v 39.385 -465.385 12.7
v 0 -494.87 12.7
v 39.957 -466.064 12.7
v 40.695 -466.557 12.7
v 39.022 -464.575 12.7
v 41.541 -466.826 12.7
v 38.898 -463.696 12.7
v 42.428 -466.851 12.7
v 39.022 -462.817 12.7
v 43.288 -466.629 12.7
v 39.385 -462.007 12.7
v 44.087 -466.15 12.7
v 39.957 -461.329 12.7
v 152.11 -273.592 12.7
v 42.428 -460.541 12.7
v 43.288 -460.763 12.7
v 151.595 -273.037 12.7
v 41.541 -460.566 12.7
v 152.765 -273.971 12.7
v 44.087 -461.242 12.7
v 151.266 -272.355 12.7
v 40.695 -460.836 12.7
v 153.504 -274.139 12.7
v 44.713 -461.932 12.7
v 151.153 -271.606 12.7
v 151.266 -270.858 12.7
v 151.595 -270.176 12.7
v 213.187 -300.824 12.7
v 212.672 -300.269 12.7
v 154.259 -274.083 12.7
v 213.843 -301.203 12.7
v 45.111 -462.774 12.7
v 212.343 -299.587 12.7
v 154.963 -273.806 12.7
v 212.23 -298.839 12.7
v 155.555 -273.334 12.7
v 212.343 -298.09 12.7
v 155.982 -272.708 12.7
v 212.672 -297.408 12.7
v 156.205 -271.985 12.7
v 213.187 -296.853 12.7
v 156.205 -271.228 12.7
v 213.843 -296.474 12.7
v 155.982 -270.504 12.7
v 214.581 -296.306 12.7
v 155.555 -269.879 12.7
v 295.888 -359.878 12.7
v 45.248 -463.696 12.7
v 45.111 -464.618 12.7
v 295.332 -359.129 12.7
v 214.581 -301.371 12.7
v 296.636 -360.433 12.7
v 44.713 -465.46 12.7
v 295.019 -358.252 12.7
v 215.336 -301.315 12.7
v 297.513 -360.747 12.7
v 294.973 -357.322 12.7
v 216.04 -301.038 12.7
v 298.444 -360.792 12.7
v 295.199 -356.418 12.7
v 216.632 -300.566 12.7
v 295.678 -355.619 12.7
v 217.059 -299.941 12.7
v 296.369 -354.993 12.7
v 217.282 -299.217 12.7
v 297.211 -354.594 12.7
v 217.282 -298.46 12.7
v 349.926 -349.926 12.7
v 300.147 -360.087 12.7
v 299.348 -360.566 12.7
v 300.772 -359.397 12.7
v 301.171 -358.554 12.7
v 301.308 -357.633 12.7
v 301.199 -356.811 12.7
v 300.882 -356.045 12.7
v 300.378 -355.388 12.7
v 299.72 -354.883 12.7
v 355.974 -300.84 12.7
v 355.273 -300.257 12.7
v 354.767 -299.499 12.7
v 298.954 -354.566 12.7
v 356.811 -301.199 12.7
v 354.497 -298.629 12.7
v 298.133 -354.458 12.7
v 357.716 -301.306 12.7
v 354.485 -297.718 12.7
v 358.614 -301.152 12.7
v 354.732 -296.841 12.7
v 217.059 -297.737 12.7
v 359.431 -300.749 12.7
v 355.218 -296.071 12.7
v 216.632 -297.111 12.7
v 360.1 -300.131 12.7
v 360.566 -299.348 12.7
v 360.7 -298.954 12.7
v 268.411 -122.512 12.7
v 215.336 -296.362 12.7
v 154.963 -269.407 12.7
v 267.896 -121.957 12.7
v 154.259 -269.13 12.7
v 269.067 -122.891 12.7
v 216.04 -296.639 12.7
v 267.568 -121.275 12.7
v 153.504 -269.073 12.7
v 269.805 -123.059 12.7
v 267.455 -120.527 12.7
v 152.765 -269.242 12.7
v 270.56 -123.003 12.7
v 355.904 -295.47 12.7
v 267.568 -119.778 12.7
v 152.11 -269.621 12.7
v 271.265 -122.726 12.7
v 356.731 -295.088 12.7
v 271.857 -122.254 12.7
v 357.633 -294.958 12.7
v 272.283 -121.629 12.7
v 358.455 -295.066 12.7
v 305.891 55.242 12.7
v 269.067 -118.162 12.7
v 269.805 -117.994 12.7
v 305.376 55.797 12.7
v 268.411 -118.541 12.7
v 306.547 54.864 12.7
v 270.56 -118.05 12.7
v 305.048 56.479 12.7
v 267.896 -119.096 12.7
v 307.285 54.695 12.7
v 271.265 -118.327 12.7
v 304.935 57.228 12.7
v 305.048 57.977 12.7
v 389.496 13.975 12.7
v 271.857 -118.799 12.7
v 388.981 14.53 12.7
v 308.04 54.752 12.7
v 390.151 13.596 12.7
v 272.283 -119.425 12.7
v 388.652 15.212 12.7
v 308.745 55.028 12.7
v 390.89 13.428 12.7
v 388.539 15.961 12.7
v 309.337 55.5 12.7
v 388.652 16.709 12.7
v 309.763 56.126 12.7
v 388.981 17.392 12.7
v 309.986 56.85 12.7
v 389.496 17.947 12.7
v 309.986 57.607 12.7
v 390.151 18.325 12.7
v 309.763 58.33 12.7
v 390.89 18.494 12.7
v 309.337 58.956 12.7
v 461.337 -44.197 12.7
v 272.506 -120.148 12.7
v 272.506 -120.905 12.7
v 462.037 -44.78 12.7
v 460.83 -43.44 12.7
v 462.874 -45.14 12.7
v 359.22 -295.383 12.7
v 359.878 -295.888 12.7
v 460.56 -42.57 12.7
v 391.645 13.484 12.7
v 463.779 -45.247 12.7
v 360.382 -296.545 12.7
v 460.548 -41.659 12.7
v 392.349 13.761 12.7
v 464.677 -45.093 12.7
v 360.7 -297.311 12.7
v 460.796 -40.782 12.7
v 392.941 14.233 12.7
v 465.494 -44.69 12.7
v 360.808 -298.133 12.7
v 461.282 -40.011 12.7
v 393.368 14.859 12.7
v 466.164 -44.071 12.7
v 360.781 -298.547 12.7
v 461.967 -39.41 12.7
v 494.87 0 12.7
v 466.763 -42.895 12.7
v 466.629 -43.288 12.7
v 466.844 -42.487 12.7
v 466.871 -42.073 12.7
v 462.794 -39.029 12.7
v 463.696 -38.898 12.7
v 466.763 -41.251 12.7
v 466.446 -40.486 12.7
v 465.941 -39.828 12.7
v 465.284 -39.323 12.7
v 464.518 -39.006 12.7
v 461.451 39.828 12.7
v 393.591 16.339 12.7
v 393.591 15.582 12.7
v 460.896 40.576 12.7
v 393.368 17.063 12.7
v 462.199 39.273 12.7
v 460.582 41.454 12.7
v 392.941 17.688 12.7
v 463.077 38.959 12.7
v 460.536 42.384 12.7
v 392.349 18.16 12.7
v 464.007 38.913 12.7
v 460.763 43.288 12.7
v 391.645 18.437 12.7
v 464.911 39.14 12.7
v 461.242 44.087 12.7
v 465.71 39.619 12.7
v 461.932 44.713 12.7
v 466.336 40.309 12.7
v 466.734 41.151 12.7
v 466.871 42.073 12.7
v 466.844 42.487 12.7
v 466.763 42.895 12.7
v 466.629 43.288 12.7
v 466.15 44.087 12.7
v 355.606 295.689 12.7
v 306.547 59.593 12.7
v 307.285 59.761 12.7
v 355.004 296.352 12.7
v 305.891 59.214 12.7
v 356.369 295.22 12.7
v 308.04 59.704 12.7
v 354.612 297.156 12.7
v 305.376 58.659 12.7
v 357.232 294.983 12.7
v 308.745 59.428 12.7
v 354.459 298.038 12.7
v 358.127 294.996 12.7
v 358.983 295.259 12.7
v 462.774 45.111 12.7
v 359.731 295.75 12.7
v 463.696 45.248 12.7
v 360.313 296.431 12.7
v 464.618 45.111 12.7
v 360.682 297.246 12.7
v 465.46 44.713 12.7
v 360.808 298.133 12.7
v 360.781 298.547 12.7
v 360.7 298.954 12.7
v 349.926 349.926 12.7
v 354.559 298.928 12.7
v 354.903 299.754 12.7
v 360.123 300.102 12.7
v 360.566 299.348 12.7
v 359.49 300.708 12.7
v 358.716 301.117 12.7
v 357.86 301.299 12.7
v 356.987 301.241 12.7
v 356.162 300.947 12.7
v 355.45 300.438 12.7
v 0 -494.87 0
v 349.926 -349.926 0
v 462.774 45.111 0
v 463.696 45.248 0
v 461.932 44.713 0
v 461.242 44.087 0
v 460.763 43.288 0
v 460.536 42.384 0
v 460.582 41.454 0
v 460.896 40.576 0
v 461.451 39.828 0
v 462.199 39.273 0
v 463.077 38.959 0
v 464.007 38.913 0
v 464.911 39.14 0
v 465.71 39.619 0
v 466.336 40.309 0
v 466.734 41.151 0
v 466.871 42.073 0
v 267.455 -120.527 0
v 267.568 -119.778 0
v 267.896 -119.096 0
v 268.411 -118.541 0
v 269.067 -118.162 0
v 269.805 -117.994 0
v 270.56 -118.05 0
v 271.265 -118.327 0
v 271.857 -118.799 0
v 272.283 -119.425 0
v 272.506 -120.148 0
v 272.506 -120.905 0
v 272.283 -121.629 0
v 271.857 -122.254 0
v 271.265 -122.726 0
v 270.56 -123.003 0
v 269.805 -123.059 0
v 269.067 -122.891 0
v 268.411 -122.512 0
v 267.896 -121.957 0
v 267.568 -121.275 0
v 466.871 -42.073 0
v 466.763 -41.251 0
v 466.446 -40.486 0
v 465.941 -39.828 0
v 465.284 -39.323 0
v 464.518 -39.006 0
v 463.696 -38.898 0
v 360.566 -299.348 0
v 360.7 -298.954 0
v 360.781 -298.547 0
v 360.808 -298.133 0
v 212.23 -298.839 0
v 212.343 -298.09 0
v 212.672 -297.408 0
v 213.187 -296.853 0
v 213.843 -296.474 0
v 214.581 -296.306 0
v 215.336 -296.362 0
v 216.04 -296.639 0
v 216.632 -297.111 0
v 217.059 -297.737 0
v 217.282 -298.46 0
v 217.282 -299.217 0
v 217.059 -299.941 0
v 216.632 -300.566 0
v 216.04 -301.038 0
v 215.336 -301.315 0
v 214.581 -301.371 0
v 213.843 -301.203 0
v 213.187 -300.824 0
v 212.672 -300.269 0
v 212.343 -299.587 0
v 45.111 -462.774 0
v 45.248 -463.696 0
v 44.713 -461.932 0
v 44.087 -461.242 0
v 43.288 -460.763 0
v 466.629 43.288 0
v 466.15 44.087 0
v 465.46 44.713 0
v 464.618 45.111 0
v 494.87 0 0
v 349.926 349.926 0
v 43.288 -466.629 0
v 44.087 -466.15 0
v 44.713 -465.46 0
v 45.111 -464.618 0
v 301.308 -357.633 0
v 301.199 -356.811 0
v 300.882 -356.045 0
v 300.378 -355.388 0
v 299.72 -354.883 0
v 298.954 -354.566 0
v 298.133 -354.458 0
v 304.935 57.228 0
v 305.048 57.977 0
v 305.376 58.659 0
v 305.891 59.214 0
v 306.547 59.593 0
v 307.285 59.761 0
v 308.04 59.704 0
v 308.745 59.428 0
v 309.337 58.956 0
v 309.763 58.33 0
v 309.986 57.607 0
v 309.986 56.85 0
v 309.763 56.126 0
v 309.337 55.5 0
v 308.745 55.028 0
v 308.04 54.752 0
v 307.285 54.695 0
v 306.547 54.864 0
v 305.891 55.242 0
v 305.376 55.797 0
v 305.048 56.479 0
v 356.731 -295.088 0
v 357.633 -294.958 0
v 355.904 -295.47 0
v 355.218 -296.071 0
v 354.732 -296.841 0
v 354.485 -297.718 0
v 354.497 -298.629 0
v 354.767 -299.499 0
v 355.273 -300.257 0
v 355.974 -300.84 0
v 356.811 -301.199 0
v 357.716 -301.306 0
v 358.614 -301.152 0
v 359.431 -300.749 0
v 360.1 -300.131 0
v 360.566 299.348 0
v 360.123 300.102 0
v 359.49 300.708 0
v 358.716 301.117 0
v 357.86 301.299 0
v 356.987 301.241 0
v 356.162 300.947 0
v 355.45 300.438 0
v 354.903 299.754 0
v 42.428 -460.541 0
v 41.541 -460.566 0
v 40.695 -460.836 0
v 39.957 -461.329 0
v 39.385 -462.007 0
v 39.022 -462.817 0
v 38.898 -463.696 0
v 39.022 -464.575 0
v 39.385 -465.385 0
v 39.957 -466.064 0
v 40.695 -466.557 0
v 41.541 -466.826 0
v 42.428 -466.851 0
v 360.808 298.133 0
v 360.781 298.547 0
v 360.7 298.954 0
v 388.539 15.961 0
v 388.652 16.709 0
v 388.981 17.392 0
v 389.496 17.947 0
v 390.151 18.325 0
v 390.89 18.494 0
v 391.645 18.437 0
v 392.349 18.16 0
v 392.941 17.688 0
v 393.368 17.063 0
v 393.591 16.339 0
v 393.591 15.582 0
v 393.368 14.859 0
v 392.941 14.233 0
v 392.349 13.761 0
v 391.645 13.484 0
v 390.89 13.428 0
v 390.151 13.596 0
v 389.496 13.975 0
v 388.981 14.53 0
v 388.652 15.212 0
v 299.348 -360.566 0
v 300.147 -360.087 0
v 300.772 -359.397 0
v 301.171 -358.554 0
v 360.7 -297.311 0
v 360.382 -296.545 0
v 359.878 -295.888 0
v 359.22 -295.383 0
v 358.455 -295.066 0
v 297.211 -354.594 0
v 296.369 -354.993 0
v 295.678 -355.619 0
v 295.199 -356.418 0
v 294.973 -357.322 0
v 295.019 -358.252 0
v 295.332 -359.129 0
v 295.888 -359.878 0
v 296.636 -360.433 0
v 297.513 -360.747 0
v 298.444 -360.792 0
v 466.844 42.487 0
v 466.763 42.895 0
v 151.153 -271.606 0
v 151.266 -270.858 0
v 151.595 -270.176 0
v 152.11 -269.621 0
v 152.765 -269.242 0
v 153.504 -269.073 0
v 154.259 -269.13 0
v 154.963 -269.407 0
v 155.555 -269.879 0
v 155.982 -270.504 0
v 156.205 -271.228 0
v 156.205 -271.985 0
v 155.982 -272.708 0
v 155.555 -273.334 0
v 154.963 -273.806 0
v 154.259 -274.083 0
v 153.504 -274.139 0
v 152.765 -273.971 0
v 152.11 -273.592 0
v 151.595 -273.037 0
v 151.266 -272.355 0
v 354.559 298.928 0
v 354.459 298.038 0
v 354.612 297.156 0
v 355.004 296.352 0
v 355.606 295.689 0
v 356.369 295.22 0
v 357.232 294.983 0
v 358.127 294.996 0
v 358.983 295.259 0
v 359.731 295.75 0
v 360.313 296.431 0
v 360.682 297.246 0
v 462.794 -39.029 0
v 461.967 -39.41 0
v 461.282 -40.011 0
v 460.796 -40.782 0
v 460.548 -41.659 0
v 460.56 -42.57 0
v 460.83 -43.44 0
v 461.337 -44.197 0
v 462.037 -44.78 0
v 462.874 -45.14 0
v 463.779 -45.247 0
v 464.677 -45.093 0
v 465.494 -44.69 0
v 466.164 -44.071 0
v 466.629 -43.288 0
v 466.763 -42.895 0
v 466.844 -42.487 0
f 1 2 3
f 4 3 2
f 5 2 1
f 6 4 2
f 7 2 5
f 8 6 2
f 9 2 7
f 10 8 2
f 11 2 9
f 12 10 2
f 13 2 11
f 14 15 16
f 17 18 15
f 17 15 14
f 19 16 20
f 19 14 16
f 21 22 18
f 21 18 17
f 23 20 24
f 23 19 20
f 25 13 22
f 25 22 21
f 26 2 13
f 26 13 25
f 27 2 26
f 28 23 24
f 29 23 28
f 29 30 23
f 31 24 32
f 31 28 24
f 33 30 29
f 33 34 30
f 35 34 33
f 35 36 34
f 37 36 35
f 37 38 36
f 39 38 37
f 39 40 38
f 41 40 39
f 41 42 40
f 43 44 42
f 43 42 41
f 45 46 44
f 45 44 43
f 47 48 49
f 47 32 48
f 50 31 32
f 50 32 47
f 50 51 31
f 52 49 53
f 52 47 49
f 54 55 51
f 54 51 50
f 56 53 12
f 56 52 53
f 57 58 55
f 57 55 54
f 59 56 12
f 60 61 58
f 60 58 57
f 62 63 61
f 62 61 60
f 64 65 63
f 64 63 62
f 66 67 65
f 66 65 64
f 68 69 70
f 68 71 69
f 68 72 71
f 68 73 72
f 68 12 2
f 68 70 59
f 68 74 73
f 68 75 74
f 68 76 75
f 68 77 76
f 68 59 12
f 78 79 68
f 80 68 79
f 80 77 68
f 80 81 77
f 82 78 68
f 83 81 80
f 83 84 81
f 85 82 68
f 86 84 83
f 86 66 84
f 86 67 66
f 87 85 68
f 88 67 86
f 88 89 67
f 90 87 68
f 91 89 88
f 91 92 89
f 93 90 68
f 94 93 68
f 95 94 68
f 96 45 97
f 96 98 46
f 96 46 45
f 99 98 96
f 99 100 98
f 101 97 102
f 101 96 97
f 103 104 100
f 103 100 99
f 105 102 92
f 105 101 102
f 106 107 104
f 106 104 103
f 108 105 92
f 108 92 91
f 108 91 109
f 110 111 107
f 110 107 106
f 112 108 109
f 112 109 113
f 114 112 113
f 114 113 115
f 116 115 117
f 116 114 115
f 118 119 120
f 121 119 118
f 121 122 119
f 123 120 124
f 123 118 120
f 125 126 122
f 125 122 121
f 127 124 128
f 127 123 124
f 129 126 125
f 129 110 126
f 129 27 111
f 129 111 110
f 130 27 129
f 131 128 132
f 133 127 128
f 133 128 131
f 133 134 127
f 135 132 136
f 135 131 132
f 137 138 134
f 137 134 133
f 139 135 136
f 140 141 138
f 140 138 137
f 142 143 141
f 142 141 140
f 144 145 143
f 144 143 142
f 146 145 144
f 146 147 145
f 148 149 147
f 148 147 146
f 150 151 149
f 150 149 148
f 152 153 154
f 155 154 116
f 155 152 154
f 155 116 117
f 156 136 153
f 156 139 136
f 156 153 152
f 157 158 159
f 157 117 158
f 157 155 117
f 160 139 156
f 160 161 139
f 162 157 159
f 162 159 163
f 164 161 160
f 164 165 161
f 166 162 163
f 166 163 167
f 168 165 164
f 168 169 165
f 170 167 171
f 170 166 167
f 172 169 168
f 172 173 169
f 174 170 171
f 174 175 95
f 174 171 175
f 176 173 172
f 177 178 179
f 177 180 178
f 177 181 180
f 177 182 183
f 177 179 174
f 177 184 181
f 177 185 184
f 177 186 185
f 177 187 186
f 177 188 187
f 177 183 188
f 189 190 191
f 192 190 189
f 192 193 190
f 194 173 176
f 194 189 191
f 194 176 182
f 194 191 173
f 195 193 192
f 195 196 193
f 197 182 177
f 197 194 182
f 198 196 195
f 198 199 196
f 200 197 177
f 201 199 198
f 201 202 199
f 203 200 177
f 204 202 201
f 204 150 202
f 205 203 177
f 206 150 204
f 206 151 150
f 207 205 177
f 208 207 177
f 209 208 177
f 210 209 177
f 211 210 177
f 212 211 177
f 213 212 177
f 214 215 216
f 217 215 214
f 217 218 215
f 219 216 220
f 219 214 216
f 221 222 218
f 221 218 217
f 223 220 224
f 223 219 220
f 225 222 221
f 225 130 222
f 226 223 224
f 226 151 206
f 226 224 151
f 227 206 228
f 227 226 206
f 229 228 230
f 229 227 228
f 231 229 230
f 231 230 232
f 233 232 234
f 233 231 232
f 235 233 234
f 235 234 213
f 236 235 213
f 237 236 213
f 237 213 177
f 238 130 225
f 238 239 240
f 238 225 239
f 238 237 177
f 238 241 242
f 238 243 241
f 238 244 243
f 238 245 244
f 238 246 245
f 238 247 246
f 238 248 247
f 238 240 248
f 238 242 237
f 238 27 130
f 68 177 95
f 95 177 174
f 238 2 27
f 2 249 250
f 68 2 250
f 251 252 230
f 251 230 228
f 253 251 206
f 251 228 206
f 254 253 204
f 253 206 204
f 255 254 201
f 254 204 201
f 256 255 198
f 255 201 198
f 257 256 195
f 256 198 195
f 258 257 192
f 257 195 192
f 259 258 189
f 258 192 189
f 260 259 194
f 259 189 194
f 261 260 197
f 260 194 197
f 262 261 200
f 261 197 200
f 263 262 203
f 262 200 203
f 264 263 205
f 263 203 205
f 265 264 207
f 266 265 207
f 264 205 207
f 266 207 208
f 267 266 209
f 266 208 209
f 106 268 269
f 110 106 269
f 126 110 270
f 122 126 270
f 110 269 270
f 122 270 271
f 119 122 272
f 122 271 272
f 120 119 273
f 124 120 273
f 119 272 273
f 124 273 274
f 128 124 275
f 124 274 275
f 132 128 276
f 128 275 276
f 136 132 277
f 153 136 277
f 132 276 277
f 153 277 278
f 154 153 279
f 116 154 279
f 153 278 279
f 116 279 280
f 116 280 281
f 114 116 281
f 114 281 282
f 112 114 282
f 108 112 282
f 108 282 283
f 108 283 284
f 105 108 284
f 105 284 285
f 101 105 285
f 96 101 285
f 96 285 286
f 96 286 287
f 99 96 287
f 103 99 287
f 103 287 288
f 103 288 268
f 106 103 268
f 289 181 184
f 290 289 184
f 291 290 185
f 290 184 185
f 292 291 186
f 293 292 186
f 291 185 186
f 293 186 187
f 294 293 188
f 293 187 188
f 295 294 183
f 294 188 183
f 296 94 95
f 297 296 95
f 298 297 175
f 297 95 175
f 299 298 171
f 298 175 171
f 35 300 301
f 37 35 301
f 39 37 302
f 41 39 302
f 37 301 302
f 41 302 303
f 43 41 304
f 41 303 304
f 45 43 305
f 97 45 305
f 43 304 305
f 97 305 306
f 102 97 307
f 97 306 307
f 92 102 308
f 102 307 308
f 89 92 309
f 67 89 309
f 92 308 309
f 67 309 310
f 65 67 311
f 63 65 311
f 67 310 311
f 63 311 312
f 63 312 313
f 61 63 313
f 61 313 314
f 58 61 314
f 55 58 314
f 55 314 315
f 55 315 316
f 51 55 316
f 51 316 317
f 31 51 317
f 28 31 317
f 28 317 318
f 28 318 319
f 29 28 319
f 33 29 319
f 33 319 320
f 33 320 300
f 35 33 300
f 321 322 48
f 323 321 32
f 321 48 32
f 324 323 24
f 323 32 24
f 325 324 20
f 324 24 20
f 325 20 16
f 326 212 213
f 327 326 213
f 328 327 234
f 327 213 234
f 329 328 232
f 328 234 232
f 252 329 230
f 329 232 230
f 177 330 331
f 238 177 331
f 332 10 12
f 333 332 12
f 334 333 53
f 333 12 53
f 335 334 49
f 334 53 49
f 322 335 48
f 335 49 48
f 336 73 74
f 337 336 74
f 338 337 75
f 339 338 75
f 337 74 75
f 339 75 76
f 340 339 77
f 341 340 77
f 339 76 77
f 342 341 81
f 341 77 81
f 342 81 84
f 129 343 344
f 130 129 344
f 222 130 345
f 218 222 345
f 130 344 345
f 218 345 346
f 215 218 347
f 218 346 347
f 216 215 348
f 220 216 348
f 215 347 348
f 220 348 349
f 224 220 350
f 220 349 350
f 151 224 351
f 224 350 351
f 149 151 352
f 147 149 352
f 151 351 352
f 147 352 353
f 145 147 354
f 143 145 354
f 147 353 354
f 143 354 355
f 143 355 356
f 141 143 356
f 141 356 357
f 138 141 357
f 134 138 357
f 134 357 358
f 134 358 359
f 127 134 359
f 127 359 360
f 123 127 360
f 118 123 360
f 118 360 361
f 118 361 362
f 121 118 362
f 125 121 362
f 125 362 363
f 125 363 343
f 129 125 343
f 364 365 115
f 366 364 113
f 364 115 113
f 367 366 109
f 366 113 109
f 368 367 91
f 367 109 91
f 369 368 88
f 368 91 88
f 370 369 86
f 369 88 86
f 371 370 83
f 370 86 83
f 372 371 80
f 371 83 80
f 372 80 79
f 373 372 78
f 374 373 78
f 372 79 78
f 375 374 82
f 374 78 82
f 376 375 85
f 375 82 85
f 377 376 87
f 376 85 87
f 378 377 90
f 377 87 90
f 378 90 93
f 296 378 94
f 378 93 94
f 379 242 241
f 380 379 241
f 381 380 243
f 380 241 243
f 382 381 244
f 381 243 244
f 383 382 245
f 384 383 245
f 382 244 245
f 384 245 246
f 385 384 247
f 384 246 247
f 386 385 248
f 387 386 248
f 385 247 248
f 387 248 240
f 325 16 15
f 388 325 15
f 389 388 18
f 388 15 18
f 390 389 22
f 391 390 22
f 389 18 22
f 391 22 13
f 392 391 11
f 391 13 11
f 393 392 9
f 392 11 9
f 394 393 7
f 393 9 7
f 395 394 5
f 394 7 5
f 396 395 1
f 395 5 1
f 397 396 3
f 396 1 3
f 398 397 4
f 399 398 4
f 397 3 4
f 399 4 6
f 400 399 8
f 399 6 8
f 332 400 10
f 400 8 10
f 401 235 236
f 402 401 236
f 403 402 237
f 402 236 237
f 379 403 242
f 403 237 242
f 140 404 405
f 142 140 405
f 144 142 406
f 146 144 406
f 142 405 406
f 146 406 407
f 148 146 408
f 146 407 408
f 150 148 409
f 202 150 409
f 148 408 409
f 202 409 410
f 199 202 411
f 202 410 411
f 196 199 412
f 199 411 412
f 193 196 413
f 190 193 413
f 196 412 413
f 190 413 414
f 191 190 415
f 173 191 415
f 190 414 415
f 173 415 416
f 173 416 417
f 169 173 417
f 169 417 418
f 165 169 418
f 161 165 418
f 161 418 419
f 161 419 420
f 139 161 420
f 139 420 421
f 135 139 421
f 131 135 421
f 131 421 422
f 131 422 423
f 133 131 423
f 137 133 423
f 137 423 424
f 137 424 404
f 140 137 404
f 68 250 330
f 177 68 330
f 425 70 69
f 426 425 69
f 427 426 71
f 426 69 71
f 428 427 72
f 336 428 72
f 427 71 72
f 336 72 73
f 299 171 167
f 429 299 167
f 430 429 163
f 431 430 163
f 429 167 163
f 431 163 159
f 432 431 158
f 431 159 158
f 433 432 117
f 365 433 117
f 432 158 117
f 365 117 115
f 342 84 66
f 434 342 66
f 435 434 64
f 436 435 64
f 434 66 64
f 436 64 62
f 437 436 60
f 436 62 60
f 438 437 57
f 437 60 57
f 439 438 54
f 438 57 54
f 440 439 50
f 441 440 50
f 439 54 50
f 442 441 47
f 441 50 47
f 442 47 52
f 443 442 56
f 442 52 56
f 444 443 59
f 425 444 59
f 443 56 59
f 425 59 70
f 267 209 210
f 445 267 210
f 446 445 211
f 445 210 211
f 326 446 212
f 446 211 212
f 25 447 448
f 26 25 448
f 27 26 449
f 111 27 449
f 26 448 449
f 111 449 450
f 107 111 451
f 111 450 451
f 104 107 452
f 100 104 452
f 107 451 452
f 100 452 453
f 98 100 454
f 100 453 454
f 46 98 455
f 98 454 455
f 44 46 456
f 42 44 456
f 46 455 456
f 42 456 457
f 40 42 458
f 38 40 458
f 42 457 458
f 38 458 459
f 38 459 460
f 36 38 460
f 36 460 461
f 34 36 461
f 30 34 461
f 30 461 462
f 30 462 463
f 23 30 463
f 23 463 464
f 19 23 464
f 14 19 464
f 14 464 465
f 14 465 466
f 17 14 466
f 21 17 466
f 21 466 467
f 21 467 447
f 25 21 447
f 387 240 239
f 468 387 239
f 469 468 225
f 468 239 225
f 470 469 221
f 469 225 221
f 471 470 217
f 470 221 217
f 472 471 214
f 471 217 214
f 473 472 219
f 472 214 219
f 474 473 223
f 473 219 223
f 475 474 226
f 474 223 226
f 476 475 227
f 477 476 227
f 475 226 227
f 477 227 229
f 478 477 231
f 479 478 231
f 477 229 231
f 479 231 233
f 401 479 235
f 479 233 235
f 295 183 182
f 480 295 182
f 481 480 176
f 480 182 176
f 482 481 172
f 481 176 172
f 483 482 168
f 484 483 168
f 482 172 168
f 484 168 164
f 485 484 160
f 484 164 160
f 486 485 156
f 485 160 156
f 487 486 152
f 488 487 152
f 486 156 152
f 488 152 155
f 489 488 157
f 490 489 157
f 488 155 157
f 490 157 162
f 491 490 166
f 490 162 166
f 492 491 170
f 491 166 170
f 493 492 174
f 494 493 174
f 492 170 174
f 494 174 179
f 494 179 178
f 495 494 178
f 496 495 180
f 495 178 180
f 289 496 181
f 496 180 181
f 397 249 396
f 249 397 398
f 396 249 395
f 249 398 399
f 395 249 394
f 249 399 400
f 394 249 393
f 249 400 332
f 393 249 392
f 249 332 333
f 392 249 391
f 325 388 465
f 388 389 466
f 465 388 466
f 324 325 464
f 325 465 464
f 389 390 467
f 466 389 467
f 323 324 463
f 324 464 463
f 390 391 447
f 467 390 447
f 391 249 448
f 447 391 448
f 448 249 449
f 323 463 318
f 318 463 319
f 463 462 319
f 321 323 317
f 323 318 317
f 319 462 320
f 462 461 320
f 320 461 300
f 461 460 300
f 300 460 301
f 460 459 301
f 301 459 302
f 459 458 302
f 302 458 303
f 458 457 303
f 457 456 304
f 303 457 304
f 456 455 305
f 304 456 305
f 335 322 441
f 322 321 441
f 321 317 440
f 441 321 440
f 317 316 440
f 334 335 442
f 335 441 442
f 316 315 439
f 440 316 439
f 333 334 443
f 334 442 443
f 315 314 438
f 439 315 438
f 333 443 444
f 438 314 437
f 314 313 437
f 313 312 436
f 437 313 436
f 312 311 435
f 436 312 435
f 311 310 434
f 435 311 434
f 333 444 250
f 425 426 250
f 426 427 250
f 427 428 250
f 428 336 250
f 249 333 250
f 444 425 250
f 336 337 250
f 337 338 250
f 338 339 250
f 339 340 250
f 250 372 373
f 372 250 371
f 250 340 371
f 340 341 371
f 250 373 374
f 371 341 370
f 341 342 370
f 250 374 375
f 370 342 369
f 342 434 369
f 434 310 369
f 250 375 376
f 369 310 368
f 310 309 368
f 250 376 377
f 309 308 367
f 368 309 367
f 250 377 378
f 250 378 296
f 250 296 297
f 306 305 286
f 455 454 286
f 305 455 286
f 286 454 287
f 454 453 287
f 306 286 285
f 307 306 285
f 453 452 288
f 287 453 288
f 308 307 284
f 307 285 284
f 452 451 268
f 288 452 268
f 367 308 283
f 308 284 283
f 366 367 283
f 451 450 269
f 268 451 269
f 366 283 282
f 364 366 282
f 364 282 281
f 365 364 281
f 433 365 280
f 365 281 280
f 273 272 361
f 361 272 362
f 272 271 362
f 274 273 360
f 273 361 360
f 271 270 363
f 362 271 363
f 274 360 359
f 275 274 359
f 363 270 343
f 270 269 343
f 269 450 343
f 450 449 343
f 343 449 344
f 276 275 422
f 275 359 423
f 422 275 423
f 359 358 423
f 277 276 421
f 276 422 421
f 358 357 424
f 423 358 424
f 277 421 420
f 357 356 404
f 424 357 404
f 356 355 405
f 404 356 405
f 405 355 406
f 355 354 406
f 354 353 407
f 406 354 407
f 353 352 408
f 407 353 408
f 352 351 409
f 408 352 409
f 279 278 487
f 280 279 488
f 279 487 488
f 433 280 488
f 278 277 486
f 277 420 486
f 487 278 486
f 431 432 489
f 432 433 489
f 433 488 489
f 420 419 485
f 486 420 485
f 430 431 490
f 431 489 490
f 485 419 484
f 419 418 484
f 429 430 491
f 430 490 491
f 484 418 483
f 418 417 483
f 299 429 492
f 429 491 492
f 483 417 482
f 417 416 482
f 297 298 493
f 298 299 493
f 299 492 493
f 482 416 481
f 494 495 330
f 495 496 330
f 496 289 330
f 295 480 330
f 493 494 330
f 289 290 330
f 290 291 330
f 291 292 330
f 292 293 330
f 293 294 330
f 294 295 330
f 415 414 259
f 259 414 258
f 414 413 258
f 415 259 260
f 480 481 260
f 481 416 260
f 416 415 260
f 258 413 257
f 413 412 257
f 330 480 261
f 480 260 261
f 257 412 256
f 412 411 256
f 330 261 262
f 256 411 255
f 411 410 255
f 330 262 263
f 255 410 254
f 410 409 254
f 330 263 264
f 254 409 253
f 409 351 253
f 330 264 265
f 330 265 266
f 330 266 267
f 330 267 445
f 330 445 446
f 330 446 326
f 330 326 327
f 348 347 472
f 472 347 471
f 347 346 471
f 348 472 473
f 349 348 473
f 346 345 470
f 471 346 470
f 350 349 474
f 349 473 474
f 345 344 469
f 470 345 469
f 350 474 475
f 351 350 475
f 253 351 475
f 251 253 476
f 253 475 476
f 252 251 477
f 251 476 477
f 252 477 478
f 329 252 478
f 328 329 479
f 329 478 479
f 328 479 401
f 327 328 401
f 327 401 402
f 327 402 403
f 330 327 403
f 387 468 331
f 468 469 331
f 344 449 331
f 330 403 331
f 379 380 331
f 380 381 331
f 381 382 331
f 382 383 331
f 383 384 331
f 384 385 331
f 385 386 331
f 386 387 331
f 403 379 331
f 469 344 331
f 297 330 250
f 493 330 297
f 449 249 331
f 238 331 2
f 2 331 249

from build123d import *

# Parameters (mm, degrees)
F1_DEPTH = 12.7
F3_DEPTH = 12.701
F5_D     = 5.08


with BuildPart() as f1:
    # F0 (on Top) → F1 (new body)
    with BuildSketch(Plane.XY):
        Polygon((349.925731, -349.925731), (494.869714, 0), (349.925731, 349.925731), (0, -494.869714), align=None)
    extrude(amount=F1_DEPTH)

    # F2 (on face) → F3 (cut, through all)
    with BuildSketch(Plane.XY.offset(12.7)):
        with BuildLine():
            Line((357.632779, 298.132571), (354.903108, 299.75415))
            ThreePointArc((354.903108, 299.75415), (356.79197, 295.070926), (360.807779, 298.132571))
            ThreePointArc((360.807779, 298.132571), (360.746772, 298.751982), (360.566096, 299.347591))
            Line((360.566096, 299.347591), (357.632779, 298.132571))
        make_face()
        with BuildLine():
            ThreePointArc((360.566096, 299.347591), (357.860135, 301.29942), (354.903108, 299.75415))
            Line((354.903108, 299.75415), (357.632779, 298.132571))
            Line((357.632779, 298.132571), (360.566096, 299.347591))
        make_face()
        with BuildLine():
            Line((463.696126, 42.073001), (463.696126, 45.248001))
            ThreePointArc((463.696126, 45.248001), (461.451062, 39.827937), (466.871126, 42.073001))
            ThreePointArc((466.871126, 42.073001), (466.810119, 42.692412), (466.629443, 43.288021))
            Line((466.629443, 43.288021), (463.696126, 42.073001))
        make_face()
        with BuildLine():
            ThreePointArc((466.629443, 43.288021), (465.460061, 44.712917), (463.696126, 45.248001))
            Line((463.696126, 45.248001), (463.696126, 42.073001))
            Line((463.696126, 42.073001), (466.629443, 43.288021))
        make_face()
        with BuildLine():
            ThreePointArc((466.629443, -43.288021), (466.810119, -42.692412), (466.871126, -42.073001))
            ThreePointArc((466.871126, -42.073001), (465.94119, -39.827937), (463.696126, -38.898001))
            Line((463.696126, -38.898001), (463.696126, -42.073001))
            Line((463.696126, -42.073001), (466.629443, -43.288021))
        make_face()
        with BuildLine():
            Line((463.696126, -42.073001), (463.696126, -38.898001))
            ThreePointArc((463.696126, -38.898001), (461.05621, -43.836936), (466.629443, -43.288021))
            Line((466.629443, -43.288021), (463.696126, -42.073001))
        make_face()
        with BuildLine():
            ThreePointArc((360.566096, -299.347591), (360.746772, -298.751982), (360.807779, -298.132571))
            ThreePointArc((360.807779, -298.132571), (359.877843, -295.887507), (357.632779, -294.957571))
            Line((357.632779, -294.957571), (357.632779, -298.132571))
            Line((357.632779, -298.132571), (360.566096, -299.347591))
        make_face()
        with BuildLine():
            Line((357.632779, -298.132571), (357.632779, -294.957571))
            ThreePointArc((357.632779, -294.957571), (354.992863, -299.896506), (360.566096, -299.347591))
            Line((360.566096, -299.347591), (357.632779, -298.132571))
        make_face()
        with BuildLine():
            ThreePointArc((299.347591, -360.566096), (300.772487, -359.396714), (301.307571, -357.632779))
            ThreePointArc((301.307571, -357.632779), (300.377635, -355.387715), (298.132571, -354.457779))
            Line((298.132571, -354.457779), (298.132571, -357.632779))
            Line((298.132571, -357.632779), (299.347591, -360.566096))
        make_face()
        with BuildLine():
            Line((298.132571, -357.632779), (298.132571, -354.457779))
            ThreePointArc((298.132571, -354.457779), (295.018577, -358.252191), (299.347591, -360.566096))
            Line((299.347591, -360.566096), (298.132571, -357.632779))
        make_face()
        with BuildLine():
            ThreePointArc((43.288021, -466.629443), (44.712917, -465.460061), (45.248001, -463.696126))
            ThreePointArc((45.248001, -463.696126), (44.712917, -461.93219), (43.288021, -460.762808))
            Line((43.288021, -460.762808), (42.073001, -463.696126))
            Line((42.073001, -463.696126), (43.288021, -466.629443))
        make_face()
        with BuildLine():
            Line((42.073001, -463.696126), (43.288021, -460.762808))
            ThreePointArc((43.288021, -460.762808), (38.898001, -463.696126), (43.288021, -466.629443))
            Line((43.288021, -466.629443), (42.073001, -463.696126))
        make_face()
    extrude(amount=-F3_DEPTH, mode=Mode.SUBTRACT)

    # F5 (through all)
    with Locations(Plane.XY.offset(12.7)):
        with Locations((307.474792, 57.228103), (269.994706, -120.526589), (391.079336, 15.960708), (214.770496, -298.838586), (153.693318, -271.606386)):
            Hole(F5_D / 2)


solid = f1.part
